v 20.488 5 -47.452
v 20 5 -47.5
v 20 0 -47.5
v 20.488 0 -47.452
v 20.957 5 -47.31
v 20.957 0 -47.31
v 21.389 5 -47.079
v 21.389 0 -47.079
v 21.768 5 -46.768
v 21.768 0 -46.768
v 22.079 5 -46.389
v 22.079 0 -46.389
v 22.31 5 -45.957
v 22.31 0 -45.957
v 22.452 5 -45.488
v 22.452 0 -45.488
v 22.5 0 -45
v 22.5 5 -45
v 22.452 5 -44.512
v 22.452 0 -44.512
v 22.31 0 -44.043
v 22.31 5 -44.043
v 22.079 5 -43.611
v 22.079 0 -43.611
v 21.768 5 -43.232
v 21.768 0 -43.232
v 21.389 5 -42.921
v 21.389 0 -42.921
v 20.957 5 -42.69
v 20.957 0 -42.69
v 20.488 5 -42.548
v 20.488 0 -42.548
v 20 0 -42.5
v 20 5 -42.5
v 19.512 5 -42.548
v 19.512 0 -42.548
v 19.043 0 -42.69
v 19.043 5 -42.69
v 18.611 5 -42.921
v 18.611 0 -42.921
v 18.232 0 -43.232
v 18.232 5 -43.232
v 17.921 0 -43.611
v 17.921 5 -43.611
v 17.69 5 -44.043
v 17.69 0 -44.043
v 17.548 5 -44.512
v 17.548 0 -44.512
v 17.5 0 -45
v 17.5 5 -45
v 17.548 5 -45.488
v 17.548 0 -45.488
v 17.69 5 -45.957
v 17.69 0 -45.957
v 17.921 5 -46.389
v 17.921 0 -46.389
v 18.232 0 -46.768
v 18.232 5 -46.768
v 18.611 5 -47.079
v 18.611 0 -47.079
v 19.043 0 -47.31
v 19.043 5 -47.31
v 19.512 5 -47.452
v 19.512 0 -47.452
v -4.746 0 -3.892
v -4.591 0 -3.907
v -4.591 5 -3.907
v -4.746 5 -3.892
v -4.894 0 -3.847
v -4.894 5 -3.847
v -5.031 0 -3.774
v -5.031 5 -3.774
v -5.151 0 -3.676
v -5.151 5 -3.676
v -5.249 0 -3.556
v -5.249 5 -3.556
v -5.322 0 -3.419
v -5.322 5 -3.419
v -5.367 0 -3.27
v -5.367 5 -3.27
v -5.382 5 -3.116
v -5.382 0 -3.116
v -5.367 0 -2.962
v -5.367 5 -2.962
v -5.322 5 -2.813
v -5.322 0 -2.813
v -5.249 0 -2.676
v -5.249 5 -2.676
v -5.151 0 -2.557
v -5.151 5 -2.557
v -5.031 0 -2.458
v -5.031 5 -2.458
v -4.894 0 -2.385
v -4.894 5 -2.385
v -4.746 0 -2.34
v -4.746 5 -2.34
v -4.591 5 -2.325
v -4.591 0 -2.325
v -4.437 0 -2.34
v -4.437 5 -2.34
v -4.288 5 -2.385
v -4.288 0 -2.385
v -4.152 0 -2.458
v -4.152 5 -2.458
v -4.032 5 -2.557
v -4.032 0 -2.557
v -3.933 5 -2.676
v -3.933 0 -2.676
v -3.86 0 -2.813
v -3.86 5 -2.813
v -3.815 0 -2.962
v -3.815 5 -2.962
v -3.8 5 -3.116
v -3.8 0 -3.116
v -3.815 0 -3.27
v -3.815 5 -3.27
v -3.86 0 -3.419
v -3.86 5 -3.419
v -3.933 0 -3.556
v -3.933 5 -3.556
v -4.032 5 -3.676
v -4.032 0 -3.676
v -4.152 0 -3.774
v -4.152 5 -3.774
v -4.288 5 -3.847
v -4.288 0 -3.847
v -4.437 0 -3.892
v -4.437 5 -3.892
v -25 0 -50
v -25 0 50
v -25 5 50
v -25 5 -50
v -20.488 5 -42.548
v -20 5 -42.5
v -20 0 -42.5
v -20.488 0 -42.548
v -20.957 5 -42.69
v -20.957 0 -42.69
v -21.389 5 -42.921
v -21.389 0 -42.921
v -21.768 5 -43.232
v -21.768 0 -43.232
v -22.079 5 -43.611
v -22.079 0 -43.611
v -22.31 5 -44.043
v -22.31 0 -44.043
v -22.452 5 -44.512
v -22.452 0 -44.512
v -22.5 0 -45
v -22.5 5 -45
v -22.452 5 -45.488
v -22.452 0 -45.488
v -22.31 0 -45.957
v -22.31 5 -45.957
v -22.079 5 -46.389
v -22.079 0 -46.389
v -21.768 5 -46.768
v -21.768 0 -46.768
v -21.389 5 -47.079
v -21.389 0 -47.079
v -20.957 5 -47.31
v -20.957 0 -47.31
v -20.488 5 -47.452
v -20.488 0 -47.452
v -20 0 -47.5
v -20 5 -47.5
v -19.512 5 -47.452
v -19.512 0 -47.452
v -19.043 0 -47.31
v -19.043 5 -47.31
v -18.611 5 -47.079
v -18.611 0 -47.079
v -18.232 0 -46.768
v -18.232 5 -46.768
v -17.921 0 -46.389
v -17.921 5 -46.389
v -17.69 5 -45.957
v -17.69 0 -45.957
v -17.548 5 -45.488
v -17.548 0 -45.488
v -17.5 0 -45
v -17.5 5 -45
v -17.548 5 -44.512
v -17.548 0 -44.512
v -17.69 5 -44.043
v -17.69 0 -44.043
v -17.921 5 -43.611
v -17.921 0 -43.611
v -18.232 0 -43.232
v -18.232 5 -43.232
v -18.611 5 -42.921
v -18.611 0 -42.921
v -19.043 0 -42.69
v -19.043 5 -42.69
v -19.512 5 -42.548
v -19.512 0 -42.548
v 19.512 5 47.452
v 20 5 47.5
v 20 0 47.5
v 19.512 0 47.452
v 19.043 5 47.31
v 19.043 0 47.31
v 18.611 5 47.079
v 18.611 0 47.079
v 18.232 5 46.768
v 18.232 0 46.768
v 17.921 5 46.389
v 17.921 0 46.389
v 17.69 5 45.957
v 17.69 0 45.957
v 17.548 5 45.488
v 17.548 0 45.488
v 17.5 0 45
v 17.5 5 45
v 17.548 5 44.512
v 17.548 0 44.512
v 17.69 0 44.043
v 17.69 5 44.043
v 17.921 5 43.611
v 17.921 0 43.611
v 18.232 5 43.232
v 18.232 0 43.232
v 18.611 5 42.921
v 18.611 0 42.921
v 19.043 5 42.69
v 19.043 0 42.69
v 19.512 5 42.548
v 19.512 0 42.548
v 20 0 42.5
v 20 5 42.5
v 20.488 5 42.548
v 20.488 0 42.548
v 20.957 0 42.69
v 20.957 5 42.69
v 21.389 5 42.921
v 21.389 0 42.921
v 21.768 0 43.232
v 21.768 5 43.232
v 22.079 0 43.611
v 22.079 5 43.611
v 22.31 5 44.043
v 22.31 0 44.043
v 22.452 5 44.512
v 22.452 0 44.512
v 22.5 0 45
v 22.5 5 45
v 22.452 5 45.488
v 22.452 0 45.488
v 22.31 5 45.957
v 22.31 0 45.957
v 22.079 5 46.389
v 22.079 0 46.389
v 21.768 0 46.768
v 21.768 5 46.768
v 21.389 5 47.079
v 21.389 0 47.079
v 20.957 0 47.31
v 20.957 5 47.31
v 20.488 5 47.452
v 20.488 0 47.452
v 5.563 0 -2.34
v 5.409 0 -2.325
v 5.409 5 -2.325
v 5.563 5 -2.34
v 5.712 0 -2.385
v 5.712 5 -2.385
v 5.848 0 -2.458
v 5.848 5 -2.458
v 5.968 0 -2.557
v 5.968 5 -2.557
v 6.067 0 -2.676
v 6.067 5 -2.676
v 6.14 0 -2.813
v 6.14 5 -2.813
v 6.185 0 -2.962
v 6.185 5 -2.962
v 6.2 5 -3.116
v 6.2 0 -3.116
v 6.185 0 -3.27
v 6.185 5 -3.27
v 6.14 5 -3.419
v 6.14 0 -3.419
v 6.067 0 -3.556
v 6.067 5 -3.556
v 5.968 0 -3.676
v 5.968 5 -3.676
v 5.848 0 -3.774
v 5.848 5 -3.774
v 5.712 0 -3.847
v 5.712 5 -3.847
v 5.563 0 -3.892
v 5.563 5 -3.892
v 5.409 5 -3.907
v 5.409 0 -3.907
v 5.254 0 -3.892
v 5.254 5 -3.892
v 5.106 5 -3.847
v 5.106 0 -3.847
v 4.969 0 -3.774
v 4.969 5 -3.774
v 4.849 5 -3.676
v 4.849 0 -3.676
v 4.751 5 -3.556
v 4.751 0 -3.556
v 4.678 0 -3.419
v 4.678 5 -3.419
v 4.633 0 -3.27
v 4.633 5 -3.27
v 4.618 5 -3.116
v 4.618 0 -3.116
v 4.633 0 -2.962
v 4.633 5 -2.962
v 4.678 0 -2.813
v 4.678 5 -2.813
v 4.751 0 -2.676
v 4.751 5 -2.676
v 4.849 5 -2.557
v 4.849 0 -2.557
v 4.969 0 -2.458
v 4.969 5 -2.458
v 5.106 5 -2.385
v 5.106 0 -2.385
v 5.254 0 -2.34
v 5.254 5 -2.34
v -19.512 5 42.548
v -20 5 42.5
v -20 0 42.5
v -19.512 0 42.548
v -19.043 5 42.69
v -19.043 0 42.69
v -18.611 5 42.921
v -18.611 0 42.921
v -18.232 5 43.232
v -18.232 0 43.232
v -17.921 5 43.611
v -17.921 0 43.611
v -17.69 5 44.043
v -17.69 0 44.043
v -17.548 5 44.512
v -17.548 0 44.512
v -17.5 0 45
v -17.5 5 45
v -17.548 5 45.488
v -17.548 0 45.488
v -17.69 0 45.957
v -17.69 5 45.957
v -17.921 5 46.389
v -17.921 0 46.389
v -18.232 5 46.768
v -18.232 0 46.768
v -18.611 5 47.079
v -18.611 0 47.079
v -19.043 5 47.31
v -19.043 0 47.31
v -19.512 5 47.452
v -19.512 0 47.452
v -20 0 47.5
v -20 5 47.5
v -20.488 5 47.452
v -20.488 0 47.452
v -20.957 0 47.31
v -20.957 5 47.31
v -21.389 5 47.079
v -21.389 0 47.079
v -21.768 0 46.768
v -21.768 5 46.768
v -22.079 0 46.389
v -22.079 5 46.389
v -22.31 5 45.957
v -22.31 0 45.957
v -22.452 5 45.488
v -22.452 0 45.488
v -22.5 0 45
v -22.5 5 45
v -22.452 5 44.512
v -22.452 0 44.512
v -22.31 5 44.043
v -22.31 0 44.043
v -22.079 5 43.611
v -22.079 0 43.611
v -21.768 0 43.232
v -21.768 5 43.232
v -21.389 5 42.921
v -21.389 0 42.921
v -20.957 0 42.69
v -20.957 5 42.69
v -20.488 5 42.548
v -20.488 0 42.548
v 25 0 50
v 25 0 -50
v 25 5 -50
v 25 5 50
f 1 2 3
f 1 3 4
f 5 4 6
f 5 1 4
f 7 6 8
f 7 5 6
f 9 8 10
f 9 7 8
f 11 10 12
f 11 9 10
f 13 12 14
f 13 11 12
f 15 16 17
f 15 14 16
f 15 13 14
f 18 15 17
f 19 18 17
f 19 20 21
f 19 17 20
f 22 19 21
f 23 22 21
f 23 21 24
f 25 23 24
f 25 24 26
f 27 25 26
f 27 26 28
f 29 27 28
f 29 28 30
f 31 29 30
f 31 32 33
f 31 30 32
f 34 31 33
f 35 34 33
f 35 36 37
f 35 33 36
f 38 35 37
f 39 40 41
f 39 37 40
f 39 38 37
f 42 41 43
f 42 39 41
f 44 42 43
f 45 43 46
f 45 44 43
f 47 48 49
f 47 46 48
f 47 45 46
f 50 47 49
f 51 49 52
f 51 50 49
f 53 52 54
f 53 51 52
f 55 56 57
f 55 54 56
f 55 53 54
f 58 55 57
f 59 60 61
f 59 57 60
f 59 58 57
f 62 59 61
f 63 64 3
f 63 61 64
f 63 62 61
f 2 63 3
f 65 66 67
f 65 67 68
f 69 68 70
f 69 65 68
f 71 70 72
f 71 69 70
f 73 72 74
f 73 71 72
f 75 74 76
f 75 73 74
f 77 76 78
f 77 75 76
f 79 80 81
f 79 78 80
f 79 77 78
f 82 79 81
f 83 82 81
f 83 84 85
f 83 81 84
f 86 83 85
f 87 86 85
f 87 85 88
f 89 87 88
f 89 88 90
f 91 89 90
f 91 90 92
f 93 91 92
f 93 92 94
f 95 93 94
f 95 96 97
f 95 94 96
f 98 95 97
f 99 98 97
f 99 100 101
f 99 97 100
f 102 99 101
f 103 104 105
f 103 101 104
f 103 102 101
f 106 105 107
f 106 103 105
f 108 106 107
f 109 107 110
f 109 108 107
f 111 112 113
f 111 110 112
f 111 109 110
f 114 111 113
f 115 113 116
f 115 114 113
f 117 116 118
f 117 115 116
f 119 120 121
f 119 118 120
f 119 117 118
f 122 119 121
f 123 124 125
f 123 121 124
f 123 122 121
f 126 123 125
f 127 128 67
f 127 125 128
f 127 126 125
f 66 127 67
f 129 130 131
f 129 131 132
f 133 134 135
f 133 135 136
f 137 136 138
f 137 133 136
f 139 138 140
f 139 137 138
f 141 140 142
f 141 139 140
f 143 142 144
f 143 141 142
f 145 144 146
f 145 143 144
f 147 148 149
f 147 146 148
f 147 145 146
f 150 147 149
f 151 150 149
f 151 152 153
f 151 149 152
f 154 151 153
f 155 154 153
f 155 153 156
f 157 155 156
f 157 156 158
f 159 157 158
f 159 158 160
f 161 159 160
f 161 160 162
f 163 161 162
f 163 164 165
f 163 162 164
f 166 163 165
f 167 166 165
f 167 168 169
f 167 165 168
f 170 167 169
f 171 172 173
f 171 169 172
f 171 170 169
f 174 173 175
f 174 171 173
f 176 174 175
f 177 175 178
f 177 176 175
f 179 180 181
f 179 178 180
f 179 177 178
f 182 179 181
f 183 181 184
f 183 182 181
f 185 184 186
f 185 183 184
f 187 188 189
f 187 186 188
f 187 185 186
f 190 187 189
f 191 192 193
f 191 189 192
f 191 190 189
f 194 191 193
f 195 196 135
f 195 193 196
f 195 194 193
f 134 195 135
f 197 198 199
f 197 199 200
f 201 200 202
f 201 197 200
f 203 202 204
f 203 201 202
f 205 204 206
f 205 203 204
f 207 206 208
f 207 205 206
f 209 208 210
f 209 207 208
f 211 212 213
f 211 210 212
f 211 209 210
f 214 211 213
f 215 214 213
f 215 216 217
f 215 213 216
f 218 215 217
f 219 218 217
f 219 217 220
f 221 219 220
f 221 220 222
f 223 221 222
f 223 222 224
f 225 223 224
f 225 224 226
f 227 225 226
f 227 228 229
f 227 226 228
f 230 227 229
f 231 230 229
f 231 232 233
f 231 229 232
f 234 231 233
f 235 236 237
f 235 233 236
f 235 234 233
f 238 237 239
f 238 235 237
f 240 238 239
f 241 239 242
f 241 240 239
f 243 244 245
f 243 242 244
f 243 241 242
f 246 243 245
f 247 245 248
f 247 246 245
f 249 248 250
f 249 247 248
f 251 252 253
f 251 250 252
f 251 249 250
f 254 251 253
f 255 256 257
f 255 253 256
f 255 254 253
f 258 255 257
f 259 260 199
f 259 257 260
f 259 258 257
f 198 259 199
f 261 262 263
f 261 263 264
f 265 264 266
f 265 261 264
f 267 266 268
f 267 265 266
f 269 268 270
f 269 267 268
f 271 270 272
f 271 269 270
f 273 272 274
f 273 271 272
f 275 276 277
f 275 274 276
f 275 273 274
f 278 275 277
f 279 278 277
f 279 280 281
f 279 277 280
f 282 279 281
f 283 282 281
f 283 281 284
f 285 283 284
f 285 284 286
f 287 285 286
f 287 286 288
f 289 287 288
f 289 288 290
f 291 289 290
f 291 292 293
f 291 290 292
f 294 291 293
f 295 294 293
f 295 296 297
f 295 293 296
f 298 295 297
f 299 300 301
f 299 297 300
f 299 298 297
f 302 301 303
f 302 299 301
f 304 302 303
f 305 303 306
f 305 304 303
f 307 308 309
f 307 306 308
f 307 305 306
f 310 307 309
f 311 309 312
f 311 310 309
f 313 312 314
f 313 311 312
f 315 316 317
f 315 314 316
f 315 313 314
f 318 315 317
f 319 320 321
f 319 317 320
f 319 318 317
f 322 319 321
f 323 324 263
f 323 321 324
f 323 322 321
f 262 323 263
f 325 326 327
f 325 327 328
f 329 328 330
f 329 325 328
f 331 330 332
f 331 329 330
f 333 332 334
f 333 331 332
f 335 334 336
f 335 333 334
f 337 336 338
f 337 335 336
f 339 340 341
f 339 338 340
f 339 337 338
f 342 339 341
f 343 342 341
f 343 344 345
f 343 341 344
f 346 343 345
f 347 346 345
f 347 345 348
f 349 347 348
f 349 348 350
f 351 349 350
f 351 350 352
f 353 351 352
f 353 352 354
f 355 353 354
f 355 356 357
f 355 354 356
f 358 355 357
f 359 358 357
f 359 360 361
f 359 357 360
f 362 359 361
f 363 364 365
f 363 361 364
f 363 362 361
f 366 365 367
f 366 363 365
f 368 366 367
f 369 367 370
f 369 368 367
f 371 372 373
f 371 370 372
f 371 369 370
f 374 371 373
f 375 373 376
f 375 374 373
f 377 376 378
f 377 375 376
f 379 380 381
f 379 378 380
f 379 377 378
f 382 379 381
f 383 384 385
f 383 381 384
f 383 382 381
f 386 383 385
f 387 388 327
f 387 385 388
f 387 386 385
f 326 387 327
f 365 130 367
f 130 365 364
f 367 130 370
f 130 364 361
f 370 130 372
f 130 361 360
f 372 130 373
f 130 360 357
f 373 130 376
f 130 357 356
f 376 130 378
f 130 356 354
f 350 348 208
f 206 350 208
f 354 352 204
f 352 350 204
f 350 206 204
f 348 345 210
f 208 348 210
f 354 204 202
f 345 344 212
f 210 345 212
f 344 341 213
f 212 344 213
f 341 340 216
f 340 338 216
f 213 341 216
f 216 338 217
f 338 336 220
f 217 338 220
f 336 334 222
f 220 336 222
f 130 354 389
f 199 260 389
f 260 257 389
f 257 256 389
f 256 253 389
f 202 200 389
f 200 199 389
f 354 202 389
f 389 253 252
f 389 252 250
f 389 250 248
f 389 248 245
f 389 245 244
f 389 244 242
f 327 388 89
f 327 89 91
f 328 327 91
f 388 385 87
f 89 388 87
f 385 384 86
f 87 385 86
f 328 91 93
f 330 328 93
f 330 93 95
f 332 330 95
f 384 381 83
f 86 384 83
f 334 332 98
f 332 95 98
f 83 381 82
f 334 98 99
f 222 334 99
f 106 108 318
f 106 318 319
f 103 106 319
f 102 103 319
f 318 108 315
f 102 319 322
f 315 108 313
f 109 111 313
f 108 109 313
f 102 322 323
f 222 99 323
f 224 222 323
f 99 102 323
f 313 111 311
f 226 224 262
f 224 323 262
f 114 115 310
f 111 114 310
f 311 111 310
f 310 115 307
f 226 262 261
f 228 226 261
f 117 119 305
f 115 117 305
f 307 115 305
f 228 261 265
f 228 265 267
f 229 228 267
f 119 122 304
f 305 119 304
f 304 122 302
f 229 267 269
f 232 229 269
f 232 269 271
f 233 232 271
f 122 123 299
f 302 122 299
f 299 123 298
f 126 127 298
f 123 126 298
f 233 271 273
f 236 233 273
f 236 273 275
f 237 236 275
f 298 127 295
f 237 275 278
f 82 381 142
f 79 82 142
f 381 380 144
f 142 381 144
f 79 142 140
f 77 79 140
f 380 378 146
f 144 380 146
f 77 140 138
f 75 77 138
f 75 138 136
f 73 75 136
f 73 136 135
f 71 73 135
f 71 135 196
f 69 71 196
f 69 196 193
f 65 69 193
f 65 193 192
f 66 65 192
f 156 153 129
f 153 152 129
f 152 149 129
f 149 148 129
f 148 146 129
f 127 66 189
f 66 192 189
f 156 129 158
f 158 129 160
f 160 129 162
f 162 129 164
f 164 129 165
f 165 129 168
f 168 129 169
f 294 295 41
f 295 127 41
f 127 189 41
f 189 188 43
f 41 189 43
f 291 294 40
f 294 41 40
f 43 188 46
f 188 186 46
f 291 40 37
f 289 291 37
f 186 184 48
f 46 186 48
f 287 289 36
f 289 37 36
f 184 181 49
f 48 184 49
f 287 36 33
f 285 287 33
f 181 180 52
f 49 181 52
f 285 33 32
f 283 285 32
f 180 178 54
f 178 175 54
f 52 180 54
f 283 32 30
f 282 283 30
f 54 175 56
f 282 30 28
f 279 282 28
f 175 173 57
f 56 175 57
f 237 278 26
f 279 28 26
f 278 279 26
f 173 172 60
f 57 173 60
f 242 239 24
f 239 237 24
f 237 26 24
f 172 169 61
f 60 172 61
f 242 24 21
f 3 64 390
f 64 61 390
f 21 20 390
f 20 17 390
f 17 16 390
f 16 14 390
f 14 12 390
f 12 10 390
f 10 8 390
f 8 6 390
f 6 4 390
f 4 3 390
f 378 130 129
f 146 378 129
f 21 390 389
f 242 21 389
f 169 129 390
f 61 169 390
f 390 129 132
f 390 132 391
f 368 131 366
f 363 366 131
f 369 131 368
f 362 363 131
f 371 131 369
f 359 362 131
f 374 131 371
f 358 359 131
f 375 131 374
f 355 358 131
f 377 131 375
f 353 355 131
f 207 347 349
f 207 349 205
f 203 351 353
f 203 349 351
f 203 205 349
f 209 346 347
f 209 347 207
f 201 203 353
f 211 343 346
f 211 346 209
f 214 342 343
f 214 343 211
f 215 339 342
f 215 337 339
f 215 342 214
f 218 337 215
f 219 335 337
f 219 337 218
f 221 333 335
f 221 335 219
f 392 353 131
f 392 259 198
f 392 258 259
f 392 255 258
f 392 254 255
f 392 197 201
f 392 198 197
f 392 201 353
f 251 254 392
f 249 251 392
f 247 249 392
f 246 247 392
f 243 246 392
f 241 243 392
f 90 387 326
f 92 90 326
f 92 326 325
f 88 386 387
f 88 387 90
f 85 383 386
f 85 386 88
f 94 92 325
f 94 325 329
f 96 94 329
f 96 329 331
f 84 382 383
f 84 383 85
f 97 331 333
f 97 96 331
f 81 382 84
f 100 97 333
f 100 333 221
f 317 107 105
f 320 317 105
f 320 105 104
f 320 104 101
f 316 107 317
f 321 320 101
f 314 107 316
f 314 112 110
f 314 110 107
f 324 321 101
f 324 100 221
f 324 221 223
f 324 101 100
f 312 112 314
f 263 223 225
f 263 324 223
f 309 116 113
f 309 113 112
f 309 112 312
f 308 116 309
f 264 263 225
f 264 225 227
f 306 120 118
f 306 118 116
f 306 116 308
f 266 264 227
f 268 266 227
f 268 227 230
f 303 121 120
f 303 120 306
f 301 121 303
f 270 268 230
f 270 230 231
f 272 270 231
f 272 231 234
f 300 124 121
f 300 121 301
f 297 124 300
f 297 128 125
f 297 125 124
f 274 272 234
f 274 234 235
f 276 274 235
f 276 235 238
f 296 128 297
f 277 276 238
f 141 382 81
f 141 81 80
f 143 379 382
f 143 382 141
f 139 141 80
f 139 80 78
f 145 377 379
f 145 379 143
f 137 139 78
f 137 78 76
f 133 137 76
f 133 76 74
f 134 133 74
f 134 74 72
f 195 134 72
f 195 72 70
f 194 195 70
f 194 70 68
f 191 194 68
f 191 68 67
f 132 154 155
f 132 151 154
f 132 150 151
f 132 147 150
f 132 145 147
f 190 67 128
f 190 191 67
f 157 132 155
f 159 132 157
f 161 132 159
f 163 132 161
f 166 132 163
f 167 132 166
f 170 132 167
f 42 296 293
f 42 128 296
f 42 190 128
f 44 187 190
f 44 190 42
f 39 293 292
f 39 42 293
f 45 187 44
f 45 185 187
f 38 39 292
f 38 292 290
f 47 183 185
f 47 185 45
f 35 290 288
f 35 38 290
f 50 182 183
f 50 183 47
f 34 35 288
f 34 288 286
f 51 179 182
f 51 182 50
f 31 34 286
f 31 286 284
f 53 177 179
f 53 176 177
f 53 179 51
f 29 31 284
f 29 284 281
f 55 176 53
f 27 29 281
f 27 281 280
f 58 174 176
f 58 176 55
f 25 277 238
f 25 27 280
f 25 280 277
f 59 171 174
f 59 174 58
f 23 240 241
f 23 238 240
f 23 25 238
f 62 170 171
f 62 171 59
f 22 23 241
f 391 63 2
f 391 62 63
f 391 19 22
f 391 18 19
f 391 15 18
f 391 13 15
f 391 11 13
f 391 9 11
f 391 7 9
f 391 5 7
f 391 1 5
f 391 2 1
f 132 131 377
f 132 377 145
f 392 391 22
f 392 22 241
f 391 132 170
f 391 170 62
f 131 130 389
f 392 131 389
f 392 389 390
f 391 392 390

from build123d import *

# Parameters (mm, degrees)
SKETCH1_W               = 50
SKETCH1_H               = 100
BOSS_EXTRUDE1_DEPTH     = 5
CUT_EXTRUDE1_DEPTH      = 57.124860802
CUT_EXTRUDE1_DEPTH_BACK = 6
SKETCH2_R               = 0.791259191
CUT_EXTRUDE2_DEPTH      = 57.124860802
CUT_EXTRUDE2_DEPTH_BACK = 57.124860802
SKETCH2_3_R             = 0.791259191
CUT_EXTRUDE3_DEPTH      = 57.124860802
CUT_EXTRUDE3_DEPTH_BACK = 57.124860802
SKETCH3_R               = 2.5


with BuildPart() as part:
    # Sketch1 → Boss-Extrude1 (new body)
    with BuildSketch(Plane(origin=(0, 0, 0), x_dir=(1, 0, 0), z_dir=(0, 1, 0))):
        Rectangle(SKETCH1_W, SKETCH1_H)
    extrude(amount=BOSS_EXTRUDE1_DEPTH)

    # Sketch2 → Cut-Extrude1 (cut, two sides: drawn at the far end of the back side and taken through both)
    with BuildSketch(Plane(origin=(0, 5, 0), x_dir=(1, 0, 0), z_dir=(0, 1, 0)).offset(-CUT_EXTRUDE1_DEPTH_BACK)):
        with Locations((-4.591141379, 3.116041861)):
            Circle(SKETCH2_R)
    extrude(amount=CUT_EXTRUDE1_DEPTH + CUT_EXTRUDE1_DEPTH_BACK, mode=Mode.SUBTRACT)

    # Sketch2<3> → Cut-Extrude2 (cut, two sides: drawn at the far end of the back side and taken through both)
    with BuildSketch(Plane(origin=(0, 5, 0), x_dir=(1, 0, 0), z_dir=(0, 1, 0)).offset(-CUT_EXTRUDE2_DEPTH_BACK)):
        with Locations((5.408858621, 3.116041861)):
            Circle(SKETCH2_3_R)
        with Locations((-4.591141379, 3.116041861)):
            Circle(SKETCH2_3_R)
    extrude(amount=CUT_EXTRUDE2_DEPTH + CUT_EXTRUDE2_DEPTH_BACK, mode=Mode.SUBTRACT)

    # Sketch3 → Cut-Extrude3 (cut, two sides: drawn at the far end of the back side and taken through both)
    with BuildSketch(Plane.XZ.offset(-CUT_EXTRUDE3_DEPTH_BACK)):
        with Locations((-20, 45)):
            Circle(SKETCH3_R)
        with Locations((20, 45)):
            Circle(SKETCH3_R)
        with Locations((20, -45)):
            Circle(SKETCH3_R)
        with Locations((-20, -45)):
            Circle(SKETCH3_R)
    extrude(amount=CUT_EXTRUDE3_DEPTH + CUT_EXTRUDE3_DEPTH_BACK, mode=Mode.SUBTRACT)


solid = part.part
